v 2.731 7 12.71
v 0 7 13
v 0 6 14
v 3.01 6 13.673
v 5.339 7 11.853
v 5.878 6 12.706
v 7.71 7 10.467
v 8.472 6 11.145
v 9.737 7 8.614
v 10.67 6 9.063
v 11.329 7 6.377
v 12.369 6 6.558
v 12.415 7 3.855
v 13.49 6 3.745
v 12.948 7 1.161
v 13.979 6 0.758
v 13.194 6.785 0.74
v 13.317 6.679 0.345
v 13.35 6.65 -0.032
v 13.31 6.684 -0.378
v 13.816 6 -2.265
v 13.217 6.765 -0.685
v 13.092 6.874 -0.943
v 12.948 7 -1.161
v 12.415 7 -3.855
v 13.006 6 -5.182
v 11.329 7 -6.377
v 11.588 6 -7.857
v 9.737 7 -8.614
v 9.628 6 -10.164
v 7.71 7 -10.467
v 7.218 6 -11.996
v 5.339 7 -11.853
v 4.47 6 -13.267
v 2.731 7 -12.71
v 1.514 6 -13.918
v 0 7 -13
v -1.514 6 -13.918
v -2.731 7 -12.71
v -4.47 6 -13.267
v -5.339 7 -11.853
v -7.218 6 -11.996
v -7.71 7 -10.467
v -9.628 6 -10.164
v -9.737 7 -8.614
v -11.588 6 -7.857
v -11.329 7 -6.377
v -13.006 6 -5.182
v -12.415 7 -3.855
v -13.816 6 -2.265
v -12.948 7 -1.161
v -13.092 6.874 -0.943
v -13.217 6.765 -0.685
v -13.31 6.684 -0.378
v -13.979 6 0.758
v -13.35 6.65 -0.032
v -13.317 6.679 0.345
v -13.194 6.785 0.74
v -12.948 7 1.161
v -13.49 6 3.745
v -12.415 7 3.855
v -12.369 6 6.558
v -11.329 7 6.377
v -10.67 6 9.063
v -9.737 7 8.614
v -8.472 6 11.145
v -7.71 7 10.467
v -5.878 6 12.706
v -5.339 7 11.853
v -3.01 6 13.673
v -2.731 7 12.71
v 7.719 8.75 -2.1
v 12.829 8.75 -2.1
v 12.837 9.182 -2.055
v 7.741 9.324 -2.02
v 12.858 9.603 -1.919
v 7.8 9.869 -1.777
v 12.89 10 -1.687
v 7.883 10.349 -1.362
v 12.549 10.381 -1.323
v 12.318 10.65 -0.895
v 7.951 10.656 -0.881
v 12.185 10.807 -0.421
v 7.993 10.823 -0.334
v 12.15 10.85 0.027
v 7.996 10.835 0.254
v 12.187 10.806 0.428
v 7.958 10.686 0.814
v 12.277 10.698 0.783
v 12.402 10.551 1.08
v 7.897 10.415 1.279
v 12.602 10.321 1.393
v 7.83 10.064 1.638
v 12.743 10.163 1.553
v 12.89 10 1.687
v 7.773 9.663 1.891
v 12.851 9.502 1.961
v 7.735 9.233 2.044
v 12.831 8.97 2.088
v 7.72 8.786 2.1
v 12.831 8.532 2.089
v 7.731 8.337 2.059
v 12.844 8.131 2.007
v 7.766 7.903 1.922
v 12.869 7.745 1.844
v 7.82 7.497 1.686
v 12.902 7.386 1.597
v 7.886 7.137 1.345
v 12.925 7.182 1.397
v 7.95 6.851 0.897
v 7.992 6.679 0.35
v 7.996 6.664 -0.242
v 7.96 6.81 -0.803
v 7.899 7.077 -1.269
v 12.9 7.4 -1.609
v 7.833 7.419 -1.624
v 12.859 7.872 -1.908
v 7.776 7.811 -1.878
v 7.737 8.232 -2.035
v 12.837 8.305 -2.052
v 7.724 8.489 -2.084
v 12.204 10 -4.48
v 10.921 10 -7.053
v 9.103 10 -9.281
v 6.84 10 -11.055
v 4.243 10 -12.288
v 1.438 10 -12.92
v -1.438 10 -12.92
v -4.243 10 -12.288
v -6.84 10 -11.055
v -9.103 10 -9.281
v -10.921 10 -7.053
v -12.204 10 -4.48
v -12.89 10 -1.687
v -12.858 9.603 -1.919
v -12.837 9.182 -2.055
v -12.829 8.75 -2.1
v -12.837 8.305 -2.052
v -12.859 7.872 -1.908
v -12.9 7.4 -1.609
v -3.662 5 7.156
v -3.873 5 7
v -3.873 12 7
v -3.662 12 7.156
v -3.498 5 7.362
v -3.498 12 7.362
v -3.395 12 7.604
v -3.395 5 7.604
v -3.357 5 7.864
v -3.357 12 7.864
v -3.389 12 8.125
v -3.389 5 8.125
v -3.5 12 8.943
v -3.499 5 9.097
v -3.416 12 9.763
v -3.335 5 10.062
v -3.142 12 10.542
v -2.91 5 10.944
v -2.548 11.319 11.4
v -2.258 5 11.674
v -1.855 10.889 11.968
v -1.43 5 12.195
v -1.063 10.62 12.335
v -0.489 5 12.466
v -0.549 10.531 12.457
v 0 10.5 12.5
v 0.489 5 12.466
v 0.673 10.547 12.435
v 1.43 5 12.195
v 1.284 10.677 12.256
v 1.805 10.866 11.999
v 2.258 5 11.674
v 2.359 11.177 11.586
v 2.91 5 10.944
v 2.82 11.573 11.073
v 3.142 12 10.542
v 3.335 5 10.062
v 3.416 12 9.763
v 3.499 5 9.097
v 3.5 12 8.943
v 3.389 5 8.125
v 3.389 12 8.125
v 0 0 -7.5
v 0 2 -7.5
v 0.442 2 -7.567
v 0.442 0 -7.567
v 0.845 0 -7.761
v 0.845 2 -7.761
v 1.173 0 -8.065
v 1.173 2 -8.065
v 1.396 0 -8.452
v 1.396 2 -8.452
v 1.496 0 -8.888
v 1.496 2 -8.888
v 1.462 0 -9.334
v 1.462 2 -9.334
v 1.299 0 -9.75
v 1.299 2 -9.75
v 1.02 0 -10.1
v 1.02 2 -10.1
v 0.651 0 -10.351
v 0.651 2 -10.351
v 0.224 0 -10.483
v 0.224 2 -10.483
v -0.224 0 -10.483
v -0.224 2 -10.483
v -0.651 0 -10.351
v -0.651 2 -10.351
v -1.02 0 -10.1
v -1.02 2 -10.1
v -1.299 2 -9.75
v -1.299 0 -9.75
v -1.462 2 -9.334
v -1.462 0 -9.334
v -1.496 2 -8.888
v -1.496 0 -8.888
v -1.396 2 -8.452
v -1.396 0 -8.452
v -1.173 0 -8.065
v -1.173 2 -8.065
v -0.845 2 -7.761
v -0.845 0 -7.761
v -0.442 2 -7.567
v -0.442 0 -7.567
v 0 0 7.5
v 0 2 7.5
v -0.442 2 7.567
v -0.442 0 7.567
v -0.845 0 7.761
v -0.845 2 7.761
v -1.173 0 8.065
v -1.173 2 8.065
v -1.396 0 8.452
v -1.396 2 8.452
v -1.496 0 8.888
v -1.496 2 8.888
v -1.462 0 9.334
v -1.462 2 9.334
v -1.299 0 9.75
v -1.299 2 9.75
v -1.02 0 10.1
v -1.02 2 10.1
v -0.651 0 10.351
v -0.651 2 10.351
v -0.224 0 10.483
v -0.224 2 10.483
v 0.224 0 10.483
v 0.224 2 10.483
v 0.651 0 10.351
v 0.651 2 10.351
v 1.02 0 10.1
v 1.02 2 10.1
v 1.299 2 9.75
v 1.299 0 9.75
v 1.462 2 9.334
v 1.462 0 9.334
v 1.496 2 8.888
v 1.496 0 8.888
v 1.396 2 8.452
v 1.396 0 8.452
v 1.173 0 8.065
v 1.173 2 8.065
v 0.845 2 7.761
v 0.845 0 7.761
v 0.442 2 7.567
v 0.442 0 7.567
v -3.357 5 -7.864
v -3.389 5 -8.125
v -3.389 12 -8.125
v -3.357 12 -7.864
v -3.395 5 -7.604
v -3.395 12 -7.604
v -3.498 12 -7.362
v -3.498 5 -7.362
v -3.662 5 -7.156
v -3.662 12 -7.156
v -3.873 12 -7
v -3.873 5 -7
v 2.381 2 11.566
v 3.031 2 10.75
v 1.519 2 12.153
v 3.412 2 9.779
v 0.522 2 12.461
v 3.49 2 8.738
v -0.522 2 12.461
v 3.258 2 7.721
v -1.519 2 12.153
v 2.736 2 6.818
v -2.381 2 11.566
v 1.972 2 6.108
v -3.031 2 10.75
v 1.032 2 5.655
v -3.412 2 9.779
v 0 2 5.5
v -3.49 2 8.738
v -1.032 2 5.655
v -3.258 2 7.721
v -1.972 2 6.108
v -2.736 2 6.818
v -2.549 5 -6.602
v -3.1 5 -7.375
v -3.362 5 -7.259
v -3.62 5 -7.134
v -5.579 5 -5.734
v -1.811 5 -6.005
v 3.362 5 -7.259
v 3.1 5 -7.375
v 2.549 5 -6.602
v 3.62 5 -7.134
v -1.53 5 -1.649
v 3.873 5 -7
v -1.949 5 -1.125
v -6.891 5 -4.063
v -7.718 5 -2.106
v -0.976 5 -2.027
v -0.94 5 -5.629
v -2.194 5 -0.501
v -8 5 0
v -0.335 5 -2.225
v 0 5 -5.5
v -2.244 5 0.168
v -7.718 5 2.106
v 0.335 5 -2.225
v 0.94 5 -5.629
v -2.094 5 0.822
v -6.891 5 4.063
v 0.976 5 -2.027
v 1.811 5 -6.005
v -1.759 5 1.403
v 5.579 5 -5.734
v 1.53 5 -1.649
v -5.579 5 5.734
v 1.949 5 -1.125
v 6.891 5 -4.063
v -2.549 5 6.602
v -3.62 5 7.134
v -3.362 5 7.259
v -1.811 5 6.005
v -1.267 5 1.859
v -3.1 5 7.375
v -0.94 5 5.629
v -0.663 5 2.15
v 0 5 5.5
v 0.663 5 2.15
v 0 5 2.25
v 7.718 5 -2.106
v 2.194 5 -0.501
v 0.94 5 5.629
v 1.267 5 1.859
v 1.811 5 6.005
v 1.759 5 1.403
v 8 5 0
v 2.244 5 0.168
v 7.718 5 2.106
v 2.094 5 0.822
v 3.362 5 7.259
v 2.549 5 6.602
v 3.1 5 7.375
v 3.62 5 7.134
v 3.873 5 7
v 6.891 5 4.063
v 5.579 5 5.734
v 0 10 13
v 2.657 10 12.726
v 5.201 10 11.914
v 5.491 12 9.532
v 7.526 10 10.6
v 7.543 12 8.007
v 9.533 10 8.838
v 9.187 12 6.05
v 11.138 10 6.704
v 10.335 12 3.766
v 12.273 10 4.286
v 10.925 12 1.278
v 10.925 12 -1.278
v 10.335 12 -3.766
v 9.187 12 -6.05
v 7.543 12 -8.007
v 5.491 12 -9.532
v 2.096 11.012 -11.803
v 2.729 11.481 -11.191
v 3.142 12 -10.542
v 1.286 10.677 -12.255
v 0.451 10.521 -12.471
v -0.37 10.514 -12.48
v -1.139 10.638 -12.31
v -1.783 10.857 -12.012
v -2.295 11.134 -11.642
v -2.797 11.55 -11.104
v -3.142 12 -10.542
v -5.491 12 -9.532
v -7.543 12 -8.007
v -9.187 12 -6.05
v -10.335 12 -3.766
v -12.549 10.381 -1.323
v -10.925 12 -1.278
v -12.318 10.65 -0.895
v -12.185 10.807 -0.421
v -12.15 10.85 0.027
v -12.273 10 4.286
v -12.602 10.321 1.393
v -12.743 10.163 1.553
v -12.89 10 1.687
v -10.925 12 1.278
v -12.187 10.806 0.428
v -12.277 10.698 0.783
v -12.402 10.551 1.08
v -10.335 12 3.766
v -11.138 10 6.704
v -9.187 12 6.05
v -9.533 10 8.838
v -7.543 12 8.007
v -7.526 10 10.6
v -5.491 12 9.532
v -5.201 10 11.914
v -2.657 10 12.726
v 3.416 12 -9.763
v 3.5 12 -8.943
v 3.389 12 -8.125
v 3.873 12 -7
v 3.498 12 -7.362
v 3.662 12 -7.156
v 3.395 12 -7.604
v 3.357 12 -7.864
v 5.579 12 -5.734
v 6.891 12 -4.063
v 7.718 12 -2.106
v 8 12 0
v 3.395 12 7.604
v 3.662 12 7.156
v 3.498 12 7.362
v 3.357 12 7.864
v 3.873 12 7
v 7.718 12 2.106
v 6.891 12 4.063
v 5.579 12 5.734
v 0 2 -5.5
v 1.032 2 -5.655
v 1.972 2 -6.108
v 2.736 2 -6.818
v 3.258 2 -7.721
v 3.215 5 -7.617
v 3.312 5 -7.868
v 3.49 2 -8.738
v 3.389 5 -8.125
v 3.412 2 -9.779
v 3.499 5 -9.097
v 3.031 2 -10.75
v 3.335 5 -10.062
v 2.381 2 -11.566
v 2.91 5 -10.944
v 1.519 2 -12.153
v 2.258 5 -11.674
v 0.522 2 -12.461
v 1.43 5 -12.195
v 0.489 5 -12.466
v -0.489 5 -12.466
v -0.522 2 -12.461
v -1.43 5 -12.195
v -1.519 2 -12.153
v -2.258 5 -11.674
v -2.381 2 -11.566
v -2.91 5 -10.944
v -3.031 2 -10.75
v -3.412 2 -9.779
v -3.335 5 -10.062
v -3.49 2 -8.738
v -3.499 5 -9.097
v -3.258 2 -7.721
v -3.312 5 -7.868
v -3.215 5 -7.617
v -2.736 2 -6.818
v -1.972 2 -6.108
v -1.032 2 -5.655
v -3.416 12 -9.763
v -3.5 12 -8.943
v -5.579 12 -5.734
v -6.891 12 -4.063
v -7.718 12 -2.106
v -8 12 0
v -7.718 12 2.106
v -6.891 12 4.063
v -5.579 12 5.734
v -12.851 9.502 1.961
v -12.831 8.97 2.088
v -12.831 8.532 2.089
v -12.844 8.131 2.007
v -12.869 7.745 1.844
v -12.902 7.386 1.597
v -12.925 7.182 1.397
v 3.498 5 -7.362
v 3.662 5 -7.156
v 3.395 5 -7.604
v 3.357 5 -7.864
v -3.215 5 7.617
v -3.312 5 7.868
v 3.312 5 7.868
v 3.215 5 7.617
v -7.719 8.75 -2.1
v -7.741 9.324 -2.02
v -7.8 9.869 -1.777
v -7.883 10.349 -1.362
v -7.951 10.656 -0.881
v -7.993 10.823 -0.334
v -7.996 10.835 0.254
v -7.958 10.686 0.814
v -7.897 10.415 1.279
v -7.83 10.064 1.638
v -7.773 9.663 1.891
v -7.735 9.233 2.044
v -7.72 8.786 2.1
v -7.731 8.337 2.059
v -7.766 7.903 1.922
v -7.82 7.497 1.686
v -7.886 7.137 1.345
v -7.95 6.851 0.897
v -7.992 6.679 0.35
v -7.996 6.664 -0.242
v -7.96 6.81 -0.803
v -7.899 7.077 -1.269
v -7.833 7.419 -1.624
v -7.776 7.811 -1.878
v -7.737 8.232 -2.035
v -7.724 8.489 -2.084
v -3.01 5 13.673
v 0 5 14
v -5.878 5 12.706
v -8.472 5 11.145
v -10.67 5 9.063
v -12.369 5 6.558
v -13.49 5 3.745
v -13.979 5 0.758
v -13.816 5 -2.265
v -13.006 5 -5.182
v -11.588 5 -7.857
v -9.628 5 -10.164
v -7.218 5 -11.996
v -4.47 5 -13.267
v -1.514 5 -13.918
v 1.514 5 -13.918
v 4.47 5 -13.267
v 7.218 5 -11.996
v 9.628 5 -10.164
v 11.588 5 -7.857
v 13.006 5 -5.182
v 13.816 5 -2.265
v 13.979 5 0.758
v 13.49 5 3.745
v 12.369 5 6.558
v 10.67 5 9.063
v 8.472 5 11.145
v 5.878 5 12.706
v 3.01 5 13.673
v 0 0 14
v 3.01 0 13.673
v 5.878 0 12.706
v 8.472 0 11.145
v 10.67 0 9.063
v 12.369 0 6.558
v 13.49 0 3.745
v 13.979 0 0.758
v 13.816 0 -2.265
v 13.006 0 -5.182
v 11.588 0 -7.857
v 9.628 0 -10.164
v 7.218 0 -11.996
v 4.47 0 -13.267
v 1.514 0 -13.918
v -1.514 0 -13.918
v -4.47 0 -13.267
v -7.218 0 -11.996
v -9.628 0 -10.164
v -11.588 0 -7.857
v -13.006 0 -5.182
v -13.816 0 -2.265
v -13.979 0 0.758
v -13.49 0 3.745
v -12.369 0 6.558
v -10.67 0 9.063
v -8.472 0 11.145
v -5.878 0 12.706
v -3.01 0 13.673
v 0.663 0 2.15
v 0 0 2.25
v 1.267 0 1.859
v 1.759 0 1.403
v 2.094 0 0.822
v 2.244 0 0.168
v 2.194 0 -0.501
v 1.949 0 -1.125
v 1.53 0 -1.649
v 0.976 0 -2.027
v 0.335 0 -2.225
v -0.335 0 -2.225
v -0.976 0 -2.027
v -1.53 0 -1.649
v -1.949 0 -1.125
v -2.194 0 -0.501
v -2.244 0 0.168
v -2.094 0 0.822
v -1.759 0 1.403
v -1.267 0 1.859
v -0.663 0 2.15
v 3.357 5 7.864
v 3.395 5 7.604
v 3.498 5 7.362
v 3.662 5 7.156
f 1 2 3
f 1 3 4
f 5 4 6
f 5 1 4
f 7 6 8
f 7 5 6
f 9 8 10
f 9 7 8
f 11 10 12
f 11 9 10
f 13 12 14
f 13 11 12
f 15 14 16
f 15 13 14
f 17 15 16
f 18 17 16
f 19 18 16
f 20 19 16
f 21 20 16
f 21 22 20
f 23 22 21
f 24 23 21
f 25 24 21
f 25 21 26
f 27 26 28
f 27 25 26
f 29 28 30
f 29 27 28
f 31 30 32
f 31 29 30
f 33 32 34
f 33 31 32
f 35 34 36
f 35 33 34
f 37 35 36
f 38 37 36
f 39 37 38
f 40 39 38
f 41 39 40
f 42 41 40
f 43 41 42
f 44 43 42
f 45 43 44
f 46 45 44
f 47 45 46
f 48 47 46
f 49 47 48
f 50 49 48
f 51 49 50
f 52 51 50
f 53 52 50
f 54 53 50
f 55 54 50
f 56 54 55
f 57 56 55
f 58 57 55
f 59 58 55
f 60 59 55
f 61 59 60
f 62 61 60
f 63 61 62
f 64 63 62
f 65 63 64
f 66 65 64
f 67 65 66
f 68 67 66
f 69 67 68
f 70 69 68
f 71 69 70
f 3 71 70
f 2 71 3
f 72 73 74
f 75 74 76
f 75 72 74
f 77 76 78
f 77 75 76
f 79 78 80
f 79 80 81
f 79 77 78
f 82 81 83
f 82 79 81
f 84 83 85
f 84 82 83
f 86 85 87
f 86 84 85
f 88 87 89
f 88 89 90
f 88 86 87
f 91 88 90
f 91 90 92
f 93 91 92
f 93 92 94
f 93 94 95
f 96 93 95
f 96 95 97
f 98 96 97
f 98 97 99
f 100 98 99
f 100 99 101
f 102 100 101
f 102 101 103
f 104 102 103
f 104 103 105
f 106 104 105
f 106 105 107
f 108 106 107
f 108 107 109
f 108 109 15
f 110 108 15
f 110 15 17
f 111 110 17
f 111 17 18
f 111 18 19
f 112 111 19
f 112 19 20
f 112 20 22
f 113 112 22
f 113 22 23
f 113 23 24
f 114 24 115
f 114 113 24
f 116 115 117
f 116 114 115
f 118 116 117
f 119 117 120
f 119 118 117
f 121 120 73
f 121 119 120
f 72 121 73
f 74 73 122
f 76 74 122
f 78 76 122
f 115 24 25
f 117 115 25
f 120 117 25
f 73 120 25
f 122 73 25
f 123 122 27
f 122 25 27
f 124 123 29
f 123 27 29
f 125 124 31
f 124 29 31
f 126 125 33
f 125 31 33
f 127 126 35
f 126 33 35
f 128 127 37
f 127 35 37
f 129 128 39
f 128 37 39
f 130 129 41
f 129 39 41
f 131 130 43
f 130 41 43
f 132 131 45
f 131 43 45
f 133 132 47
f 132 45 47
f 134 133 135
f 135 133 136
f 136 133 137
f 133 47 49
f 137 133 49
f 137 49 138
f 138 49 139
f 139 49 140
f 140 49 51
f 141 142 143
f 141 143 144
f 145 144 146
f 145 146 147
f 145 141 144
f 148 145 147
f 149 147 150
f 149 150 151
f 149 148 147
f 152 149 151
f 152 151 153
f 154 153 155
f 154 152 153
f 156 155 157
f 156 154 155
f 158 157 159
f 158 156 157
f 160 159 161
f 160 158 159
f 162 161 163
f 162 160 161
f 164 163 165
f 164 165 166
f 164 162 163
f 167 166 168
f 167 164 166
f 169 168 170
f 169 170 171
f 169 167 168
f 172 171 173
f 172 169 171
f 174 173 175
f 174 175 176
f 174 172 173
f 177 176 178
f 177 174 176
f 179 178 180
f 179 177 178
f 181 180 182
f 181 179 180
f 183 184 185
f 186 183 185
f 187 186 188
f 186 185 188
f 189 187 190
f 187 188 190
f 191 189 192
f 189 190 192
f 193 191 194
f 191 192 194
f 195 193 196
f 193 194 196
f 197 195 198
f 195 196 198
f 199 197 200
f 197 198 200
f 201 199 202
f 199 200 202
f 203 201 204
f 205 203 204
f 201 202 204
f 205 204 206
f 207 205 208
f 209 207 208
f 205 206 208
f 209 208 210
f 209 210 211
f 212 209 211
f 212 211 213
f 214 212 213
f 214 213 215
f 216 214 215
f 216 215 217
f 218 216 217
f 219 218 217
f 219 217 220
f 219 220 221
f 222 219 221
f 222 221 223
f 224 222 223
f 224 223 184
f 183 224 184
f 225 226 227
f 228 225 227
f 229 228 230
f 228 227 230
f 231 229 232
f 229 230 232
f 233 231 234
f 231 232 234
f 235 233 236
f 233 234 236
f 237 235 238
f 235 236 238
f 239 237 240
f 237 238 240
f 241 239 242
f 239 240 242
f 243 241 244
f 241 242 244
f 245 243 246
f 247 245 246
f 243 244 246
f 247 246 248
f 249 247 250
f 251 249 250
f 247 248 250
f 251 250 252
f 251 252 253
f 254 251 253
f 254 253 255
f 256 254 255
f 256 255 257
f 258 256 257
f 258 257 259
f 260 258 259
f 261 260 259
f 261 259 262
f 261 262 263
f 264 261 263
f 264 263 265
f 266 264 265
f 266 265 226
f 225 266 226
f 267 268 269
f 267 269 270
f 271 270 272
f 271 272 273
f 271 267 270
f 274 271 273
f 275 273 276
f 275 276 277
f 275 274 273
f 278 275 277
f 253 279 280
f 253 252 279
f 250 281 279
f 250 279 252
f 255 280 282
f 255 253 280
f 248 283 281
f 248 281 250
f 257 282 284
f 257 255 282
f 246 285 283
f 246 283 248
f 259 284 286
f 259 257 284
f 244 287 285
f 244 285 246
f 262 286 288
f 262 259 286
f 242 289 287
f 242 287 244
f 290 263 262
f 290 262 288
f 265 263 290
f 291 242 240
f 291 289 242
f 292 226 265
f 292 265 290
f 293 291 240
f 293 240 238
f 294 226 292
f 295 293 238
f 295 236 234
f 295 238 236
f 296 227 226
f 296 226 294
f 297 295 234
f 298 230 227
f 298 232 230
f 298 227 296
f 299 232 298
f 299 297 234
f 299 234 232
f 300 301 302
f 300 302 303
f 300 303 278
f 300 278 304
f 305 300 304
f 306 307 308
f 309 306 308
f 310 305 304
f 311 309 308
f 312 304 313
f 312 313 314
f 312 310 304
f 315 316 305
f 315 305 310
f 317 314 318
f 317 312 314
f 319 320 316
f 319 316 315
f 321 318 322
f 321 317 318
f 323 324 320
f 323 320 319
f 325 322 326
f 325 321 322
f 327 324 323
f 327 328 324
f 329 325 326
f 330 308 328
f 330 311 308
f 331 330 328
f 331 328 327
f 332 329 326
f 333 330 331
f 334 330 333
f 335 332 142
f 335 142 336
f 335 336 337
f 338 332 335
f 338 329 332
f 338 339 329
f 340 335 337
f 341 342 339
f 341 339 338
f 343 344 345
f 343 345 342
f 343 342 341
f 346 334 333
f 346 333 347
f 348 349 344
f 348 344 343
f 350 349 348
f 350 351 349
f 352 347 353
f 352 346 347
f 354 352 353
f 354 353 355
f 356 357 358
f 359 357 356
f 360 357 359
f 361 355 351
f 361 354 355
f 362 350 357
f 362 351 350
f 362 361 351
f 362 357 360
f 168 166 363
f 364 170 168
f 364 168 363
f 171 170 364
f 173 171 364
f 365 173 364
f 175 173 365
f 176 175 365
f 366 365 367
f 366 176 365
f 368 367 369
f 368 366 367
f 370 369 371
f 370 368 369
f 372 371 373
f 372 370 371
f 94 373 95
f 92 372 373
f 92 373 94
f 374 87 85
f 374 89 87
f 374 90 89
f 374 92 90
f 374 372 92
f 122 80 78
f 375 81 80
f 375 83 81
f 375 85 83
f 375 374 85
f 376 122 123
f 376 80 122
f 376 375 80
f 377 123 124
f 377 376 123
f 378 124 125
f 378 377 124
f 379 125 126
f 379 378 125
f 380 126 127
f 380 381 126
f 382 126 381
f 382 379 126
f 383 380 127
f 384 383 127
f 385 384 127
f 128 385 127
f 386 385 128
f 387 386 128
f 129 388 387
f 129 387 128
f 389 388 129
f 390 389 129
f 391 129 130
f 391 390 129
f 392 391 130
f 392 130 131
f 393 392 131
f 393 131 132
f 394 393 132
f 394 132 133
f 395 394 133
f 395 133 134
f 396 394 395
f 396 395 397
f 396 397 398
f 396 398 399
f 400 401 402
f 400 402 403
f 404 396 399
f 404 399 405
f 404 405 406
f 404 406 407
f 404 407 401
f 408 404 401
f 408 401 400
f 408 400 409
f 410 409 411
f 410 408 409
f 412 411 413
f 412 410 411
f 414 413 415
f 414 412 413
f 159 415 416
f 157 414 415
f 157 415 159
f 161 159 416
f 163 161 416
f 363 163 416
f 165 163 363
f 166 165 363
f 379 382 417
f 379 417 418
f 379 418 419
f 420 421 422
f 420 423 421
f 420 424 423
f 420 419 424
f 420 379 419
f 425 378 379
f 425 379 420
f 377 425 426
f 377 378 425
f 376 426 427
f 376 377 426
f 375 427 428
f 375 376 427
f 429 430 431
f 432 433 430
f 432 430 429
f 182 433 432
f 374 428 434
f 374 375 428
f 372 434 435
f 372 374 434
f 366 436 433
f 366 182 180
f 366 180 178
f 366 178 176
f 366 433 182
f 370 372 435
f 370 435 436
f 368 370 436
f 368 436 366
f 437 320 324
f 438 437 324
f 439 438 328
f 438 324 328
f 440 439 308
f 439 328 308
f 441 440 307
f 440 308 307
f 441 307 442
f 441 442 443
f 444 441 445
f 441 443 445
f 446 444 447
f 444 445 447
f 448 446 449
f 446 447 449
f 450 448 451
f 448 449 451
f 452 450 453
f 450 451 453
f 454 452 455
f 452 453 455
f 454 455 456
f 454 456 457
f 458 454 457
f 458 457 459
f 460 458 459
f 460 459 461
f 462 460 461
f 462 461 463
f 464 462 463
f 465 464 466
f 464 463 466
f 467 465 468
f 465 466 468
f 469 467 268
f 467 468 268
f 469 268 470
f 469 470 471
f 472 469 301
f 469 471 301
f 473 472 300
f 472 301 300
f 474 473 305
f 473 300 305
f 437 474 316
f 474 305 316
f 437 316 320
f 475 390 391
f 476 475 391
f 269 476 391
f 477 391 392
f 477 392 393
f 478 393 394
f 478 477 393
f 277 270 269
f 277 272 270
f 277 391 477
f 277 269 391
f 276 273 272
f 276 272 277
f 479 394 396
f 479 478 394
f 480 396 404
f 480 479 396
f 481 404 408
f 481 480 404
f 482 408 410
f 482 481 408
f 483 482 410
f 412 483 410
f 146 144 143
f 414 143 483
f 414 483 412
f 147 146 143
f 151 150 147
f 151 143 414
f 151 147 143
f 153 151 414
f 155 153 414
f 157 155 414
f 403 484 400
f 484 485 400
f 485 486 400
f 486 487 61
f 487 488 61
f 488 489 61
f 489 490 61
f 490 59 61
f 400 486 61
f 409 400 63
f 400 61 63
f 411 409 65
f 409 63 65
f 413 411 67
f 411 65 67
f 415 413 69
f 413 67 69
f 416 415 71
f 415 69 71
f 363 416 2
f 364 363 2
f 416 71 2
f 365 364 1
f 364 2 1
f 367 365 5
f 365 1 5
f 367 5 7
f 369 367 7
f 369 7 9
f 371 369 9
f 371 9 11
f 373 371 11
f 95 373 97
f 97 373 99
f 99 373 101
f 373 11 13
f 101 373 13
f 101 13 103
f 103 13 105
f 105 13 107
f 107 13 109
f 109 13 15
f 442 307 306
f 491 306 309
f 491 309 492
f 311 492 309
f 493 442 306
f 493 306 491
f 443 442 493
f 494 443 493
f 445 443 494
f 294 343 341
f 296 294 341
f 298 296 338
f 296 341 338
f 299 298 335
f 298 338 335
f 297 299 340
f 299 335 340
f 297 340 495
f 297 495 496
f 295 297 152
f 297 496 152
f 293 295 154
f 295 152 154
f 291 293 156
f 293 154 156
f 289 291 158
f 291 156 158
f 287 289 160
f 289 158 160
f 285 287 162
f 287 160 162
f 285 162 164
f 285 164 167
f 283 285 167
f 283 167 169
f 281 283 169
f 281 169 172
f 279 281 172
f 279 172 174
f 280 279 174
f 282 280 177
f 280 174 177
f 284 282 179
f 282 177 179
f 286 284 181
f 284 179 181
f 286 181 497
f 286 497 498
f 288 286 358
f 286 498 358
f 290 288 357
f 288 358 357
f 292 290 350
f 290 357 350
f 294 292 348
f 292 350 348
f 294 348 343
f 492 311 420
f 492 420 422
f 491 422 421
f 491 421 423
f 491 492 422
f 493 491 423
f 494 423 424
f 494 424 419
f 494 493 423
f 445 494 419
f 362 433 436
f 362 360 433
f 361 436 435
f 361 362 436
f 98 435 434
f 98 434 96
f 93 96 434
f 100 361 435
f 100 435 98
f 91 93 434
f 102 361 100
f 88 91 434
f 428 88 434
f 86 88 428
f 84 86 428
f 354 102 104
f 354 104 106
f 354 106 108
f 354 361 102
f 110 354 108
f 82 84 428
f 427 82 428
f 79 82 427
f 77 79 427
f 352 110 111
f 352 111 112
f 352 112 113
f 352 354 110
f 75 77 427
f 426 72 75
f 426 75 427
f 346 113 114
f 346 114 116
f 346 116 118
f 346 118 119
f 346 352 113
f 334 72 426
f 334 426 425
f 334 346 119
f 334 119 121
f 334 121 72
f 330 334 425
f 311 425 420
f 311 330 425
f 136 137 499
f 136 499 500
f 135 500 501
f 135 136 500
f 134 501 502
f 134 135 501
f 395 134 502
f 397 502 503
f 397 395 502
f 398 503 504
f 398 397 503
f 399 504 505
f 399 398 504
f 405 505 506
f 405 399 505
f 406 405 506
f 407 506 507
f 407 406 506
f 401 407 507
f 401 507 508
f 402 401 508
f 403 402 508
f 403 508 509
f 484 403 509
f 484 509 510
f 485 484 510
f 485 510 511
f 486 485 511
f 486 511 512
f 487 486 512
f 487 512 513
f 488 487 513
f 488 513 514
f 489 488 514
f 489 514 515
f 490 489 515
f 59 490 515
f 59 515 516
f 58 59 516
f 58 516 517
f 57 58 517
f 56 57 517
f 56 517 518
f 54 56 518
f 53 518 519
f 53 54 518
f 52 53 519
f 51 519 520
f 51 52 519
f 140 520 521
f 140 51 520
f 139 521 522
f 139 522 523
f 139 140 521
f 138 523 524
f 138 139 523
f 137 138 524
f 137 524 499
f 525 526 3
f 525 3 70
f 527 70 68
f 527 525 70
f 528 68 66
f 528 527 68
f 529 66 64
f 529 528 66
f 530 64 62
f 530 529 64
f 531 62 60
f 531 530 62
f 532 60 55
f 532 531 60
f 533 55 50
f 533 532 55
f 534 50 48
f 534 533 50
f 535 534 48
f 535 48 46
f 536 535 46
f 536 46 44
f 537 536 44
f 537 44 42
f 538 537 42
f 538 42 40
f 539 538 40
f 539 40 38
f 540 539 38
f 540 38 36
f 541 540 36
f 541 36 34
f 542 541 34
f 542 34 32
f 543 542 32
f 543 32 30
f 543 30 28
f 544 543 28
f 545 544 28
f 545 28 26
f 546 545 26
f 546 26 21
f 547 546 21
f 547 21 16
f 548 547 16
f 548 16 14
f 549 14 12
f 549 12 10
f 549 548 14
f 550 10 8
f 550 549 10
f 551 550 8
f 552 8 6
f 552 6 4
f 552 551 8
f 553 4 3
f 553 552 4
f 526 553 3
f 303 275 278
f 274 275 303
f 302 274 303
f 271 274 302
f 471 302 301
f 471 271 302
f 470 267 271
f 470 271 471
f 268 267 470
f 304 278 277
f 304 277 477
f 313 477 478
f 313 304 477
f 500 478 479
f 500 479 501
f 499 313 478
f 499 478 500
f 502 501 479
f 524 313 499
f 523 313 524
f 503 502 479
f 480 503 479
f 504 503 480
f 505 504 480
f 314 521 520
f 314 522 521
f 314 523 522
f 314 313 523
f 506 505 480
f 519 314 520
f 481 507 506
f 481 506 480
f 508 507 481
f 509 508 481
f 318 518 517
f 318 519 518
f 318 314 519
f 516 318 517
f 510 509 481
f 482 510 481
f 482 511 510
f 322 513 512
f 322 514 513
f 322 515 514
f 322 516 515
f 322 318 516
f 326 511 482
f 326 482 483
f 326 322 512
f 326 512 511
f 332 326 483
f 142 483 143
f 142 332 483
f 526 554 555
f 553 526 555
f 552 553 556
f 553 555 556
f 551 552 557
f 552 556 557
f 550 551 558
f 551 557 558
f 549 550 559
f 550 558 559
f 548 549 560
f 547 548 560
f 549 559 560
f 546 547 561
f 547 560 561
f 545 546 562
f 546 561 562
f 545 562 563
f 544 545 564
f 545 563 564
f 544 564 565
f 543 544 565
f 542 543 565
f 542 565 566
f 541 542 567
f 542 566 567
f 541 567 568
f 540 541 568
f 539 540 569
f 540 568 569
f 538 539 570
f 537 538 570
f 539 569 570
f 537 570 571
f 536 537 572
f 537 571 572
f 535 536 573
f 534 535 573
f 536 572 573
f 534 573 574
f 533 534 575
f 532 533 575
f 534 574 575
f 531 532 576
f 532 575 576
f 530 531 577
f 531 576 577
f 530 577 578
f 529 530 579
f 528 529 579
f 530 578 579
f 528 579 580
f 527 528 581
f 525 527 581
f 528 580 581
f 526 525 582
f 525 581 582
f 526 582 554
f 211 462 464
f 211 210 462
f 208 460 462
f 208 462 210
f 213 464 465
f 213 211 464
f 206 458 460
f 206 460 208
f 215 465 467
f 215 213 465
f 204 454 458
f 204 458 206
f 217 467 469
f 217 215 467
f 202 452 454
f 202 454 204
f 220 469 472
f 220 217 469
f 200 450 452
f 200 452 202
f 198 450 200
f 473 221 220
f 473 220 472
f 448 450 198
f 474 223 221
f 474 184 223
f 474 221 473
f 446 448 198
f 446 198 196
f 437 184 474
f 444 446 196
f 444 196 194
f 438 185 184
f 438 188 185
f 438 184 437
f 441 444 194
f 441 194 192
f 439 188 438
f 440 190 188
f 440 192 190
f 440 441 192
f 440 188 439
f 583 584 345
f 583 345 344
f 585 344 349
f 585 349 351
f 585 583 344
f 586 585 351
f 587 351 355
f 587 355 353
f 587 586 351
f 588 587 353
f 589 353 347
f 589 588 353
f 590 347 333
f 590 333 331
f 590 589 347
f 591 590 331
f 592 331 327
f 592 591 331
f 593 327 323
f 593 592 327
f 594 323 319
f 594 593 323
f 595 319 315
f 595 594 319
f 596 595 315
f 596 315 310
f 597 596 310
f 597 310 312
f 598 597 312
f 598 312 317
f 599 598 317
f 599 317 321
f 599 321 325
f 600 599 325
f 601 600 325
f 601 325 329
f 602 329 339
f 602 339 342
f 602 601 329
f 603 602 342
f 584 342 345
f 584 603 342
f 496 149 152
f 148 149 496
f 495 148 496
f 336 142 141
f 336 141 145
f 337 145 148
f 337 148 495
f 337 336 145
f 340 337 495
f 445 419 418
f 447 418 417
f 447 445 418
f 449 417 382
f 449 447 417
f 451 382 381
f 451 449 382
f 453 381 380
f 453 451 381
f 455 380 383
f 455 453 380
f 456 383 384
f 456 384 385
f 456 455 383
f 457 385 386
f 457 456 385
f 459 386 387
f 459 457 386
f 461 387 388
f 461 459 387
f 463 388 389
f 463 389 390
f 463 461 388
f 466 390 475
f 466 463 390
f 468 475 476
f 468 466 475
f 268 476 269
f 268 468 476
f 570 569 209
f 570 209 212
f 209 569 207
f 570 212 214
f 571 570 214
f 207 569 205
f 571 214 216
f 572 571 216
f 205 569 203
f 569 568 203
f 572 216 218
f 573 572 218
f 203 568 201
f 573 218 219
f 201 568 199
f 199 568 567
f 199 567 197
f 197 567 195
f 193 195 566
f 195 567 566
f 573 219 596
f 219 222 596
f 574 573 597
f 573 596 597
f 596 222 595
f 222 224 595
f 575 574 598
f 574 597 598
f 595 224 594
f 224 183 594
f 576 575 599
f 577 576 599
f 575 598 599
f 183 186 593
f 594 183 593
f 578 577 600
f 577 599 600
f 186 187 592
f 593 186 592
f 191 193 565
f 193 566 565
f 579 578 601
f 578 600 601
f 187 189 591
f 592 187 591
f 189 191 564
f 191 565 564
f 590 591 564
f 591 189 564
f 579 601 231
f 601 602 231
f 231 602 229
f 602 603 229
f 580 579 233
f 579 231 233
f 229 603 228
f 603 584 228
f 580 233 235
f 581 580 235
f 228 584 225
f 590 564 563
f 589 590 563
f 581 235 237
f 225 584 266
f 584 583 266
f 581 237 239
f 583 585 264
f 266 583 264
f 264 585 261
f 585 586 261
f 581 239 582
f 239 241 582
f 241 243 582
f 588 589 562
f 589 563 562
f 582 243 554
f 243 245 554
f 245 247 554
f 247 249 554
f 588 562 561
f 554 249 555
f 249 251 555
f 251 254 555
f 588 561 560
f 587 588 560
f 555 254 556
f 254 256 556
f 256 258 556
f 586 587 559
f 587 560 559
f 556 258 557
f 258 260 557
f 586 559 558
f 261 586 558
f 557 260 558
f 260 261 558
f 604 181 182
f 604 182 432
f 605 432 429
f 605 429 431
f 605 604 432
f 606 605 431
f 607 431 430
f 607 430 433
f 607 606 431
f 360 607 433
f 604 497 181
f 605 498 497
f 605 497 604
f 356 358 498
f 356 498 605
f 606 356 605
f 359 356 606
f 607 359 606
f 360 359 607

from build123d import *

# Parameters (mm, degrees)
SKETCH1_R               = 14
SKETCH1_R_2             = 2.25
BOSS_EXTRUDE1_DEPTH     = 5
SKETCH2_R               = 1.5
CUT_EXTRUDE1_DEPTH      = 21.420577857
SKETCH4_R               = 3.5
CUT_EXTRUDE2_DEPTH      = 3
CIRPATTERN1_COUNT       = 2
SKETCH5_R               = 13
SKETCH5_R_2             = 8
BOSS_EXTRUDE2_DEPTH     = 7
SKETCH6_R               = 3.5
CUT_EXTRUDE3_DEPTH      = 22
CHAMFER1_SIZE           = 2
FILLET1_START           = 5
FILLET1_DEPTH           = 8
CUT_EXTRUDE4_DEPTH      = 24.151673806
CUT_EXTRUDE4_DEPTH_BACK = 24.151673806
SKETCH8_R               = 2.1
CHAMFER2_SIZE           = 2


with BuildPart() as part:
    # Sketch1 → Boss-Extrude1 (new body)
    with BuildSketch(Plane(origin=(0, 0, 0), x_dir=(1, 0, 0), z_dir=(0, 1, 0))):
        with Locations(Location((0, 0, 0), (0, 0, 270))):
            Circle(SKETCH1_R)
        with Locations(Location((0, 0, 0), (0, 0, 270))):
            Circle(SKETCH1_R_2, mode=Mode.SUBTRACT)
    extrude(amount=BOSS_EXTRUDE1_DEPTH)

    # Sketch2 → Cut-Extrude1 (cut, through all)
    with BuildSketch(Plane(origin=(0, 5, 0), x_dir=(1, 0, 0), z_dir=(0, 1, 0))):
        with Locations(Location((0, 9, 0), (0, 0, 270))):
            Circle(SKETCH2_R)
    cut_extrude1 = extrude(amount=-CUT_EXTRUDE1_DEPTH, mode=Mode.SUBTRACT)

    # Sketch4 → Cut-Extrude2 (cut)
    with BuildSketch(Plane(origin=(0, 5, 0), x_dir=(1, 0, 0), z_dir=(0, 1, 0))):
        with Locations(Location((0, 9, 0), (0, 0, 270))):
            Circle(SKETCH4_R)
    cut_extrude2 = extrude(amount=-CUT_EXTRUDE2_DEPTH, mode=Mode.SUBTRACT)

    # CirPattern1: Cut-Extrude1, Cut-Extrude2 ×2 about axis
    cirpattern1_axis = Axis((0, 0, 0), (0, 1, 0))
    add([cut_extrude1.rotate(cirpattern1_axis, i * 360 / CIRPATTERN1_COUNT) for i in range(1, CIRPATTERN1_COUNT)], mode=Mode.SUBTRACT)
    add([cut_extrude2.rotate(cirpattern1_axis, i * 360 / CIRPATTERN1_COUNT) for i in range(1, CIRPATTERN1_COUNT)], mode=Mode.SUBTRACT)

    # Sketch5 → Boss-Extrude2 (add)
    with BuildSketch(Plane(origin=(0, 5, 0), x_dir=(1, 0, 0), z_dir=(0, 1, 0))):
        with Locations(Location((0, 0, 0), (0, 0, 270))):
            Circle(SKETCH5_R)
        with Locations(Location((0, 0, 0), (0, 0, 112.7982481))):
            Circle(SKETCH5_R_2, mode=Mode.SUBTRACT)
    extrude(amount=BOSS_EXTRUDE2_DEPTH)

    # Sketch6 → Cut-Extrude3 (cut, through all)
    with BuildSketch(Plane(origin=(0, 5, 0), x_dir=(1, 0, 0), z_dir=(0, 1, 0))):
        with Locations(Location((0, 9, 0), (0, 0, 270))):
            Circle(SKETCH6_R)
        with Locations(Location((0, -9, 0), (0, 0, 27.664004496))):
            Circle(SKETCH6_R)
    extrude(amount=CUT_EXTRUDE3_DEPTH, mode=Mode.SUBTRACT)

    # Chamfer1
    # the kernel refuses this chamfer: 2 mm, written as the material it adds along each edge
    with BuildSketch(Plane(origin=(0, 5, 0), x_dir=(0, 0, 1), z_dir=(-1, 0, 0))) as chamfer1_piece_1_section:
        Polygon((13 + CHAMFER1_SIZE, 0), (13, CHAMFER1_SIZE), (13, 0), align=None)
    chamfer1_piece_1 = revolve(axis=Axis((0, 5, 0), (0, 1, 0)), mode=Mode.PRIVATE)
    chamfer1_piece_1 = chamfer1_piece_1 & Plane(origin=(0, 5, 0), x_dir=(0, 0, 1), z_dir=(0, -1, 0)) * Cylinder(14, 61, mode=Mode.PRIVATE)
    add(chamfer1_piece_1)

    # Fillet1: read off the stored shape, not the designer's step
    # Fillet1 outline → Fillet1 (cut)
    with BuildSketch(Plane(origin=(0, 0, 0), x_dir=(1, 0, 0), z_dir=(0, 1, 0)).offset(FILLET1_START)):
        with BuildLine():
            ThreePointArc((3.388860428, -8.125), (3.438547611, -7.479715292), (3.872983346, -7))
            ThreePointArc((3.872983346, -7), (3.491479482, -7.197886567), (3.099899192, -7.375))
            ThreePointArc((3.099899192, -7.375), (3.265979999, -7.741677844), (3.388860428, -8.125))
        make_face()
        with BuildLine():
            ThreePointArc((3.099899192, 7.375), (3.491479482, 7.197886567), (3.872983346, 7))
            ThreePointArc((3.872983346, 7), (3.438547611, 7.479715292), (3.388860428, 8.125))
            ThreePointArc((3.388860428, 8.125), (3.265979999, 7.741677844), (3.099899192, 7.375))
        make_face()
        with BuildLine():
            ThreePointArc((-3.388860428, -8.125), (-3.265979999, -7.741677844), (-3.099899192, -7.375))
            ThreePointArc((-3.099899192, -7.375), (-3.491479482, -7.197886567), (-3.872983346, -7))
            ThreePointArc((-3.872983346, -7), (-3.438547611, -7.479715292), (-3.388860428, -8.125))
        make_face()
        with BuildLine():
            ThreePointArc((-3.872983346, 7), (-3.491479482, 7.197886567), (-3.099899192, 7.375))
            ThreePointArc((-3.099899192, 7.375), (-3.265979999, 7.741677844), (-3.388860428, 8.125))
            ThreePointArc((-3.388860428, 8.125), (-3.438547611, 7.479715292), (-3.872983346, 7))
        make_face()
    extrude(amount=FILLET1_DEPTH, mode=Mode.SUBTRACT)

    # Sketch8 → Cut-Extrude4 (cut, two sides: drawn at the far end of the back side and taken through both)
    with BuildSketch(Plane(origin=(0, 0, 0), x_dir=(0, 0, -1), z_dir=(1, 0, 0)).offset(-CUT_EXTRUDE4_DEPTH_BACK)):
        with Locations((0, 8.75)):
            Circle(SKETCH8_R)
    extrude(amount=CUT_EXTRUDE4_DEPTH + CUT_EXTRUDE4_DEPTH_BACK, mode=Mode.SUBTRACT)

    # Chamfer2
    # the kernel refuses this chamfer: 2 mm, written as the material it takes off along each edge
    with BuildSketch(Plane(origin=(0, 12, 0), x_dir=(0, 0, 1), z_dir=(-1, 0, 0))) as chamfer2_piece_1:
        Polygon((13, -CHAMFER2_SIZE), (13 - CHAMFER2_SIZE, 0), (13, 0), align=None)
    revolve(axis=Axis((0, 12, 0), (0, 1, 0)), mode=Mode.SUBTRACT)


solid = part.part
